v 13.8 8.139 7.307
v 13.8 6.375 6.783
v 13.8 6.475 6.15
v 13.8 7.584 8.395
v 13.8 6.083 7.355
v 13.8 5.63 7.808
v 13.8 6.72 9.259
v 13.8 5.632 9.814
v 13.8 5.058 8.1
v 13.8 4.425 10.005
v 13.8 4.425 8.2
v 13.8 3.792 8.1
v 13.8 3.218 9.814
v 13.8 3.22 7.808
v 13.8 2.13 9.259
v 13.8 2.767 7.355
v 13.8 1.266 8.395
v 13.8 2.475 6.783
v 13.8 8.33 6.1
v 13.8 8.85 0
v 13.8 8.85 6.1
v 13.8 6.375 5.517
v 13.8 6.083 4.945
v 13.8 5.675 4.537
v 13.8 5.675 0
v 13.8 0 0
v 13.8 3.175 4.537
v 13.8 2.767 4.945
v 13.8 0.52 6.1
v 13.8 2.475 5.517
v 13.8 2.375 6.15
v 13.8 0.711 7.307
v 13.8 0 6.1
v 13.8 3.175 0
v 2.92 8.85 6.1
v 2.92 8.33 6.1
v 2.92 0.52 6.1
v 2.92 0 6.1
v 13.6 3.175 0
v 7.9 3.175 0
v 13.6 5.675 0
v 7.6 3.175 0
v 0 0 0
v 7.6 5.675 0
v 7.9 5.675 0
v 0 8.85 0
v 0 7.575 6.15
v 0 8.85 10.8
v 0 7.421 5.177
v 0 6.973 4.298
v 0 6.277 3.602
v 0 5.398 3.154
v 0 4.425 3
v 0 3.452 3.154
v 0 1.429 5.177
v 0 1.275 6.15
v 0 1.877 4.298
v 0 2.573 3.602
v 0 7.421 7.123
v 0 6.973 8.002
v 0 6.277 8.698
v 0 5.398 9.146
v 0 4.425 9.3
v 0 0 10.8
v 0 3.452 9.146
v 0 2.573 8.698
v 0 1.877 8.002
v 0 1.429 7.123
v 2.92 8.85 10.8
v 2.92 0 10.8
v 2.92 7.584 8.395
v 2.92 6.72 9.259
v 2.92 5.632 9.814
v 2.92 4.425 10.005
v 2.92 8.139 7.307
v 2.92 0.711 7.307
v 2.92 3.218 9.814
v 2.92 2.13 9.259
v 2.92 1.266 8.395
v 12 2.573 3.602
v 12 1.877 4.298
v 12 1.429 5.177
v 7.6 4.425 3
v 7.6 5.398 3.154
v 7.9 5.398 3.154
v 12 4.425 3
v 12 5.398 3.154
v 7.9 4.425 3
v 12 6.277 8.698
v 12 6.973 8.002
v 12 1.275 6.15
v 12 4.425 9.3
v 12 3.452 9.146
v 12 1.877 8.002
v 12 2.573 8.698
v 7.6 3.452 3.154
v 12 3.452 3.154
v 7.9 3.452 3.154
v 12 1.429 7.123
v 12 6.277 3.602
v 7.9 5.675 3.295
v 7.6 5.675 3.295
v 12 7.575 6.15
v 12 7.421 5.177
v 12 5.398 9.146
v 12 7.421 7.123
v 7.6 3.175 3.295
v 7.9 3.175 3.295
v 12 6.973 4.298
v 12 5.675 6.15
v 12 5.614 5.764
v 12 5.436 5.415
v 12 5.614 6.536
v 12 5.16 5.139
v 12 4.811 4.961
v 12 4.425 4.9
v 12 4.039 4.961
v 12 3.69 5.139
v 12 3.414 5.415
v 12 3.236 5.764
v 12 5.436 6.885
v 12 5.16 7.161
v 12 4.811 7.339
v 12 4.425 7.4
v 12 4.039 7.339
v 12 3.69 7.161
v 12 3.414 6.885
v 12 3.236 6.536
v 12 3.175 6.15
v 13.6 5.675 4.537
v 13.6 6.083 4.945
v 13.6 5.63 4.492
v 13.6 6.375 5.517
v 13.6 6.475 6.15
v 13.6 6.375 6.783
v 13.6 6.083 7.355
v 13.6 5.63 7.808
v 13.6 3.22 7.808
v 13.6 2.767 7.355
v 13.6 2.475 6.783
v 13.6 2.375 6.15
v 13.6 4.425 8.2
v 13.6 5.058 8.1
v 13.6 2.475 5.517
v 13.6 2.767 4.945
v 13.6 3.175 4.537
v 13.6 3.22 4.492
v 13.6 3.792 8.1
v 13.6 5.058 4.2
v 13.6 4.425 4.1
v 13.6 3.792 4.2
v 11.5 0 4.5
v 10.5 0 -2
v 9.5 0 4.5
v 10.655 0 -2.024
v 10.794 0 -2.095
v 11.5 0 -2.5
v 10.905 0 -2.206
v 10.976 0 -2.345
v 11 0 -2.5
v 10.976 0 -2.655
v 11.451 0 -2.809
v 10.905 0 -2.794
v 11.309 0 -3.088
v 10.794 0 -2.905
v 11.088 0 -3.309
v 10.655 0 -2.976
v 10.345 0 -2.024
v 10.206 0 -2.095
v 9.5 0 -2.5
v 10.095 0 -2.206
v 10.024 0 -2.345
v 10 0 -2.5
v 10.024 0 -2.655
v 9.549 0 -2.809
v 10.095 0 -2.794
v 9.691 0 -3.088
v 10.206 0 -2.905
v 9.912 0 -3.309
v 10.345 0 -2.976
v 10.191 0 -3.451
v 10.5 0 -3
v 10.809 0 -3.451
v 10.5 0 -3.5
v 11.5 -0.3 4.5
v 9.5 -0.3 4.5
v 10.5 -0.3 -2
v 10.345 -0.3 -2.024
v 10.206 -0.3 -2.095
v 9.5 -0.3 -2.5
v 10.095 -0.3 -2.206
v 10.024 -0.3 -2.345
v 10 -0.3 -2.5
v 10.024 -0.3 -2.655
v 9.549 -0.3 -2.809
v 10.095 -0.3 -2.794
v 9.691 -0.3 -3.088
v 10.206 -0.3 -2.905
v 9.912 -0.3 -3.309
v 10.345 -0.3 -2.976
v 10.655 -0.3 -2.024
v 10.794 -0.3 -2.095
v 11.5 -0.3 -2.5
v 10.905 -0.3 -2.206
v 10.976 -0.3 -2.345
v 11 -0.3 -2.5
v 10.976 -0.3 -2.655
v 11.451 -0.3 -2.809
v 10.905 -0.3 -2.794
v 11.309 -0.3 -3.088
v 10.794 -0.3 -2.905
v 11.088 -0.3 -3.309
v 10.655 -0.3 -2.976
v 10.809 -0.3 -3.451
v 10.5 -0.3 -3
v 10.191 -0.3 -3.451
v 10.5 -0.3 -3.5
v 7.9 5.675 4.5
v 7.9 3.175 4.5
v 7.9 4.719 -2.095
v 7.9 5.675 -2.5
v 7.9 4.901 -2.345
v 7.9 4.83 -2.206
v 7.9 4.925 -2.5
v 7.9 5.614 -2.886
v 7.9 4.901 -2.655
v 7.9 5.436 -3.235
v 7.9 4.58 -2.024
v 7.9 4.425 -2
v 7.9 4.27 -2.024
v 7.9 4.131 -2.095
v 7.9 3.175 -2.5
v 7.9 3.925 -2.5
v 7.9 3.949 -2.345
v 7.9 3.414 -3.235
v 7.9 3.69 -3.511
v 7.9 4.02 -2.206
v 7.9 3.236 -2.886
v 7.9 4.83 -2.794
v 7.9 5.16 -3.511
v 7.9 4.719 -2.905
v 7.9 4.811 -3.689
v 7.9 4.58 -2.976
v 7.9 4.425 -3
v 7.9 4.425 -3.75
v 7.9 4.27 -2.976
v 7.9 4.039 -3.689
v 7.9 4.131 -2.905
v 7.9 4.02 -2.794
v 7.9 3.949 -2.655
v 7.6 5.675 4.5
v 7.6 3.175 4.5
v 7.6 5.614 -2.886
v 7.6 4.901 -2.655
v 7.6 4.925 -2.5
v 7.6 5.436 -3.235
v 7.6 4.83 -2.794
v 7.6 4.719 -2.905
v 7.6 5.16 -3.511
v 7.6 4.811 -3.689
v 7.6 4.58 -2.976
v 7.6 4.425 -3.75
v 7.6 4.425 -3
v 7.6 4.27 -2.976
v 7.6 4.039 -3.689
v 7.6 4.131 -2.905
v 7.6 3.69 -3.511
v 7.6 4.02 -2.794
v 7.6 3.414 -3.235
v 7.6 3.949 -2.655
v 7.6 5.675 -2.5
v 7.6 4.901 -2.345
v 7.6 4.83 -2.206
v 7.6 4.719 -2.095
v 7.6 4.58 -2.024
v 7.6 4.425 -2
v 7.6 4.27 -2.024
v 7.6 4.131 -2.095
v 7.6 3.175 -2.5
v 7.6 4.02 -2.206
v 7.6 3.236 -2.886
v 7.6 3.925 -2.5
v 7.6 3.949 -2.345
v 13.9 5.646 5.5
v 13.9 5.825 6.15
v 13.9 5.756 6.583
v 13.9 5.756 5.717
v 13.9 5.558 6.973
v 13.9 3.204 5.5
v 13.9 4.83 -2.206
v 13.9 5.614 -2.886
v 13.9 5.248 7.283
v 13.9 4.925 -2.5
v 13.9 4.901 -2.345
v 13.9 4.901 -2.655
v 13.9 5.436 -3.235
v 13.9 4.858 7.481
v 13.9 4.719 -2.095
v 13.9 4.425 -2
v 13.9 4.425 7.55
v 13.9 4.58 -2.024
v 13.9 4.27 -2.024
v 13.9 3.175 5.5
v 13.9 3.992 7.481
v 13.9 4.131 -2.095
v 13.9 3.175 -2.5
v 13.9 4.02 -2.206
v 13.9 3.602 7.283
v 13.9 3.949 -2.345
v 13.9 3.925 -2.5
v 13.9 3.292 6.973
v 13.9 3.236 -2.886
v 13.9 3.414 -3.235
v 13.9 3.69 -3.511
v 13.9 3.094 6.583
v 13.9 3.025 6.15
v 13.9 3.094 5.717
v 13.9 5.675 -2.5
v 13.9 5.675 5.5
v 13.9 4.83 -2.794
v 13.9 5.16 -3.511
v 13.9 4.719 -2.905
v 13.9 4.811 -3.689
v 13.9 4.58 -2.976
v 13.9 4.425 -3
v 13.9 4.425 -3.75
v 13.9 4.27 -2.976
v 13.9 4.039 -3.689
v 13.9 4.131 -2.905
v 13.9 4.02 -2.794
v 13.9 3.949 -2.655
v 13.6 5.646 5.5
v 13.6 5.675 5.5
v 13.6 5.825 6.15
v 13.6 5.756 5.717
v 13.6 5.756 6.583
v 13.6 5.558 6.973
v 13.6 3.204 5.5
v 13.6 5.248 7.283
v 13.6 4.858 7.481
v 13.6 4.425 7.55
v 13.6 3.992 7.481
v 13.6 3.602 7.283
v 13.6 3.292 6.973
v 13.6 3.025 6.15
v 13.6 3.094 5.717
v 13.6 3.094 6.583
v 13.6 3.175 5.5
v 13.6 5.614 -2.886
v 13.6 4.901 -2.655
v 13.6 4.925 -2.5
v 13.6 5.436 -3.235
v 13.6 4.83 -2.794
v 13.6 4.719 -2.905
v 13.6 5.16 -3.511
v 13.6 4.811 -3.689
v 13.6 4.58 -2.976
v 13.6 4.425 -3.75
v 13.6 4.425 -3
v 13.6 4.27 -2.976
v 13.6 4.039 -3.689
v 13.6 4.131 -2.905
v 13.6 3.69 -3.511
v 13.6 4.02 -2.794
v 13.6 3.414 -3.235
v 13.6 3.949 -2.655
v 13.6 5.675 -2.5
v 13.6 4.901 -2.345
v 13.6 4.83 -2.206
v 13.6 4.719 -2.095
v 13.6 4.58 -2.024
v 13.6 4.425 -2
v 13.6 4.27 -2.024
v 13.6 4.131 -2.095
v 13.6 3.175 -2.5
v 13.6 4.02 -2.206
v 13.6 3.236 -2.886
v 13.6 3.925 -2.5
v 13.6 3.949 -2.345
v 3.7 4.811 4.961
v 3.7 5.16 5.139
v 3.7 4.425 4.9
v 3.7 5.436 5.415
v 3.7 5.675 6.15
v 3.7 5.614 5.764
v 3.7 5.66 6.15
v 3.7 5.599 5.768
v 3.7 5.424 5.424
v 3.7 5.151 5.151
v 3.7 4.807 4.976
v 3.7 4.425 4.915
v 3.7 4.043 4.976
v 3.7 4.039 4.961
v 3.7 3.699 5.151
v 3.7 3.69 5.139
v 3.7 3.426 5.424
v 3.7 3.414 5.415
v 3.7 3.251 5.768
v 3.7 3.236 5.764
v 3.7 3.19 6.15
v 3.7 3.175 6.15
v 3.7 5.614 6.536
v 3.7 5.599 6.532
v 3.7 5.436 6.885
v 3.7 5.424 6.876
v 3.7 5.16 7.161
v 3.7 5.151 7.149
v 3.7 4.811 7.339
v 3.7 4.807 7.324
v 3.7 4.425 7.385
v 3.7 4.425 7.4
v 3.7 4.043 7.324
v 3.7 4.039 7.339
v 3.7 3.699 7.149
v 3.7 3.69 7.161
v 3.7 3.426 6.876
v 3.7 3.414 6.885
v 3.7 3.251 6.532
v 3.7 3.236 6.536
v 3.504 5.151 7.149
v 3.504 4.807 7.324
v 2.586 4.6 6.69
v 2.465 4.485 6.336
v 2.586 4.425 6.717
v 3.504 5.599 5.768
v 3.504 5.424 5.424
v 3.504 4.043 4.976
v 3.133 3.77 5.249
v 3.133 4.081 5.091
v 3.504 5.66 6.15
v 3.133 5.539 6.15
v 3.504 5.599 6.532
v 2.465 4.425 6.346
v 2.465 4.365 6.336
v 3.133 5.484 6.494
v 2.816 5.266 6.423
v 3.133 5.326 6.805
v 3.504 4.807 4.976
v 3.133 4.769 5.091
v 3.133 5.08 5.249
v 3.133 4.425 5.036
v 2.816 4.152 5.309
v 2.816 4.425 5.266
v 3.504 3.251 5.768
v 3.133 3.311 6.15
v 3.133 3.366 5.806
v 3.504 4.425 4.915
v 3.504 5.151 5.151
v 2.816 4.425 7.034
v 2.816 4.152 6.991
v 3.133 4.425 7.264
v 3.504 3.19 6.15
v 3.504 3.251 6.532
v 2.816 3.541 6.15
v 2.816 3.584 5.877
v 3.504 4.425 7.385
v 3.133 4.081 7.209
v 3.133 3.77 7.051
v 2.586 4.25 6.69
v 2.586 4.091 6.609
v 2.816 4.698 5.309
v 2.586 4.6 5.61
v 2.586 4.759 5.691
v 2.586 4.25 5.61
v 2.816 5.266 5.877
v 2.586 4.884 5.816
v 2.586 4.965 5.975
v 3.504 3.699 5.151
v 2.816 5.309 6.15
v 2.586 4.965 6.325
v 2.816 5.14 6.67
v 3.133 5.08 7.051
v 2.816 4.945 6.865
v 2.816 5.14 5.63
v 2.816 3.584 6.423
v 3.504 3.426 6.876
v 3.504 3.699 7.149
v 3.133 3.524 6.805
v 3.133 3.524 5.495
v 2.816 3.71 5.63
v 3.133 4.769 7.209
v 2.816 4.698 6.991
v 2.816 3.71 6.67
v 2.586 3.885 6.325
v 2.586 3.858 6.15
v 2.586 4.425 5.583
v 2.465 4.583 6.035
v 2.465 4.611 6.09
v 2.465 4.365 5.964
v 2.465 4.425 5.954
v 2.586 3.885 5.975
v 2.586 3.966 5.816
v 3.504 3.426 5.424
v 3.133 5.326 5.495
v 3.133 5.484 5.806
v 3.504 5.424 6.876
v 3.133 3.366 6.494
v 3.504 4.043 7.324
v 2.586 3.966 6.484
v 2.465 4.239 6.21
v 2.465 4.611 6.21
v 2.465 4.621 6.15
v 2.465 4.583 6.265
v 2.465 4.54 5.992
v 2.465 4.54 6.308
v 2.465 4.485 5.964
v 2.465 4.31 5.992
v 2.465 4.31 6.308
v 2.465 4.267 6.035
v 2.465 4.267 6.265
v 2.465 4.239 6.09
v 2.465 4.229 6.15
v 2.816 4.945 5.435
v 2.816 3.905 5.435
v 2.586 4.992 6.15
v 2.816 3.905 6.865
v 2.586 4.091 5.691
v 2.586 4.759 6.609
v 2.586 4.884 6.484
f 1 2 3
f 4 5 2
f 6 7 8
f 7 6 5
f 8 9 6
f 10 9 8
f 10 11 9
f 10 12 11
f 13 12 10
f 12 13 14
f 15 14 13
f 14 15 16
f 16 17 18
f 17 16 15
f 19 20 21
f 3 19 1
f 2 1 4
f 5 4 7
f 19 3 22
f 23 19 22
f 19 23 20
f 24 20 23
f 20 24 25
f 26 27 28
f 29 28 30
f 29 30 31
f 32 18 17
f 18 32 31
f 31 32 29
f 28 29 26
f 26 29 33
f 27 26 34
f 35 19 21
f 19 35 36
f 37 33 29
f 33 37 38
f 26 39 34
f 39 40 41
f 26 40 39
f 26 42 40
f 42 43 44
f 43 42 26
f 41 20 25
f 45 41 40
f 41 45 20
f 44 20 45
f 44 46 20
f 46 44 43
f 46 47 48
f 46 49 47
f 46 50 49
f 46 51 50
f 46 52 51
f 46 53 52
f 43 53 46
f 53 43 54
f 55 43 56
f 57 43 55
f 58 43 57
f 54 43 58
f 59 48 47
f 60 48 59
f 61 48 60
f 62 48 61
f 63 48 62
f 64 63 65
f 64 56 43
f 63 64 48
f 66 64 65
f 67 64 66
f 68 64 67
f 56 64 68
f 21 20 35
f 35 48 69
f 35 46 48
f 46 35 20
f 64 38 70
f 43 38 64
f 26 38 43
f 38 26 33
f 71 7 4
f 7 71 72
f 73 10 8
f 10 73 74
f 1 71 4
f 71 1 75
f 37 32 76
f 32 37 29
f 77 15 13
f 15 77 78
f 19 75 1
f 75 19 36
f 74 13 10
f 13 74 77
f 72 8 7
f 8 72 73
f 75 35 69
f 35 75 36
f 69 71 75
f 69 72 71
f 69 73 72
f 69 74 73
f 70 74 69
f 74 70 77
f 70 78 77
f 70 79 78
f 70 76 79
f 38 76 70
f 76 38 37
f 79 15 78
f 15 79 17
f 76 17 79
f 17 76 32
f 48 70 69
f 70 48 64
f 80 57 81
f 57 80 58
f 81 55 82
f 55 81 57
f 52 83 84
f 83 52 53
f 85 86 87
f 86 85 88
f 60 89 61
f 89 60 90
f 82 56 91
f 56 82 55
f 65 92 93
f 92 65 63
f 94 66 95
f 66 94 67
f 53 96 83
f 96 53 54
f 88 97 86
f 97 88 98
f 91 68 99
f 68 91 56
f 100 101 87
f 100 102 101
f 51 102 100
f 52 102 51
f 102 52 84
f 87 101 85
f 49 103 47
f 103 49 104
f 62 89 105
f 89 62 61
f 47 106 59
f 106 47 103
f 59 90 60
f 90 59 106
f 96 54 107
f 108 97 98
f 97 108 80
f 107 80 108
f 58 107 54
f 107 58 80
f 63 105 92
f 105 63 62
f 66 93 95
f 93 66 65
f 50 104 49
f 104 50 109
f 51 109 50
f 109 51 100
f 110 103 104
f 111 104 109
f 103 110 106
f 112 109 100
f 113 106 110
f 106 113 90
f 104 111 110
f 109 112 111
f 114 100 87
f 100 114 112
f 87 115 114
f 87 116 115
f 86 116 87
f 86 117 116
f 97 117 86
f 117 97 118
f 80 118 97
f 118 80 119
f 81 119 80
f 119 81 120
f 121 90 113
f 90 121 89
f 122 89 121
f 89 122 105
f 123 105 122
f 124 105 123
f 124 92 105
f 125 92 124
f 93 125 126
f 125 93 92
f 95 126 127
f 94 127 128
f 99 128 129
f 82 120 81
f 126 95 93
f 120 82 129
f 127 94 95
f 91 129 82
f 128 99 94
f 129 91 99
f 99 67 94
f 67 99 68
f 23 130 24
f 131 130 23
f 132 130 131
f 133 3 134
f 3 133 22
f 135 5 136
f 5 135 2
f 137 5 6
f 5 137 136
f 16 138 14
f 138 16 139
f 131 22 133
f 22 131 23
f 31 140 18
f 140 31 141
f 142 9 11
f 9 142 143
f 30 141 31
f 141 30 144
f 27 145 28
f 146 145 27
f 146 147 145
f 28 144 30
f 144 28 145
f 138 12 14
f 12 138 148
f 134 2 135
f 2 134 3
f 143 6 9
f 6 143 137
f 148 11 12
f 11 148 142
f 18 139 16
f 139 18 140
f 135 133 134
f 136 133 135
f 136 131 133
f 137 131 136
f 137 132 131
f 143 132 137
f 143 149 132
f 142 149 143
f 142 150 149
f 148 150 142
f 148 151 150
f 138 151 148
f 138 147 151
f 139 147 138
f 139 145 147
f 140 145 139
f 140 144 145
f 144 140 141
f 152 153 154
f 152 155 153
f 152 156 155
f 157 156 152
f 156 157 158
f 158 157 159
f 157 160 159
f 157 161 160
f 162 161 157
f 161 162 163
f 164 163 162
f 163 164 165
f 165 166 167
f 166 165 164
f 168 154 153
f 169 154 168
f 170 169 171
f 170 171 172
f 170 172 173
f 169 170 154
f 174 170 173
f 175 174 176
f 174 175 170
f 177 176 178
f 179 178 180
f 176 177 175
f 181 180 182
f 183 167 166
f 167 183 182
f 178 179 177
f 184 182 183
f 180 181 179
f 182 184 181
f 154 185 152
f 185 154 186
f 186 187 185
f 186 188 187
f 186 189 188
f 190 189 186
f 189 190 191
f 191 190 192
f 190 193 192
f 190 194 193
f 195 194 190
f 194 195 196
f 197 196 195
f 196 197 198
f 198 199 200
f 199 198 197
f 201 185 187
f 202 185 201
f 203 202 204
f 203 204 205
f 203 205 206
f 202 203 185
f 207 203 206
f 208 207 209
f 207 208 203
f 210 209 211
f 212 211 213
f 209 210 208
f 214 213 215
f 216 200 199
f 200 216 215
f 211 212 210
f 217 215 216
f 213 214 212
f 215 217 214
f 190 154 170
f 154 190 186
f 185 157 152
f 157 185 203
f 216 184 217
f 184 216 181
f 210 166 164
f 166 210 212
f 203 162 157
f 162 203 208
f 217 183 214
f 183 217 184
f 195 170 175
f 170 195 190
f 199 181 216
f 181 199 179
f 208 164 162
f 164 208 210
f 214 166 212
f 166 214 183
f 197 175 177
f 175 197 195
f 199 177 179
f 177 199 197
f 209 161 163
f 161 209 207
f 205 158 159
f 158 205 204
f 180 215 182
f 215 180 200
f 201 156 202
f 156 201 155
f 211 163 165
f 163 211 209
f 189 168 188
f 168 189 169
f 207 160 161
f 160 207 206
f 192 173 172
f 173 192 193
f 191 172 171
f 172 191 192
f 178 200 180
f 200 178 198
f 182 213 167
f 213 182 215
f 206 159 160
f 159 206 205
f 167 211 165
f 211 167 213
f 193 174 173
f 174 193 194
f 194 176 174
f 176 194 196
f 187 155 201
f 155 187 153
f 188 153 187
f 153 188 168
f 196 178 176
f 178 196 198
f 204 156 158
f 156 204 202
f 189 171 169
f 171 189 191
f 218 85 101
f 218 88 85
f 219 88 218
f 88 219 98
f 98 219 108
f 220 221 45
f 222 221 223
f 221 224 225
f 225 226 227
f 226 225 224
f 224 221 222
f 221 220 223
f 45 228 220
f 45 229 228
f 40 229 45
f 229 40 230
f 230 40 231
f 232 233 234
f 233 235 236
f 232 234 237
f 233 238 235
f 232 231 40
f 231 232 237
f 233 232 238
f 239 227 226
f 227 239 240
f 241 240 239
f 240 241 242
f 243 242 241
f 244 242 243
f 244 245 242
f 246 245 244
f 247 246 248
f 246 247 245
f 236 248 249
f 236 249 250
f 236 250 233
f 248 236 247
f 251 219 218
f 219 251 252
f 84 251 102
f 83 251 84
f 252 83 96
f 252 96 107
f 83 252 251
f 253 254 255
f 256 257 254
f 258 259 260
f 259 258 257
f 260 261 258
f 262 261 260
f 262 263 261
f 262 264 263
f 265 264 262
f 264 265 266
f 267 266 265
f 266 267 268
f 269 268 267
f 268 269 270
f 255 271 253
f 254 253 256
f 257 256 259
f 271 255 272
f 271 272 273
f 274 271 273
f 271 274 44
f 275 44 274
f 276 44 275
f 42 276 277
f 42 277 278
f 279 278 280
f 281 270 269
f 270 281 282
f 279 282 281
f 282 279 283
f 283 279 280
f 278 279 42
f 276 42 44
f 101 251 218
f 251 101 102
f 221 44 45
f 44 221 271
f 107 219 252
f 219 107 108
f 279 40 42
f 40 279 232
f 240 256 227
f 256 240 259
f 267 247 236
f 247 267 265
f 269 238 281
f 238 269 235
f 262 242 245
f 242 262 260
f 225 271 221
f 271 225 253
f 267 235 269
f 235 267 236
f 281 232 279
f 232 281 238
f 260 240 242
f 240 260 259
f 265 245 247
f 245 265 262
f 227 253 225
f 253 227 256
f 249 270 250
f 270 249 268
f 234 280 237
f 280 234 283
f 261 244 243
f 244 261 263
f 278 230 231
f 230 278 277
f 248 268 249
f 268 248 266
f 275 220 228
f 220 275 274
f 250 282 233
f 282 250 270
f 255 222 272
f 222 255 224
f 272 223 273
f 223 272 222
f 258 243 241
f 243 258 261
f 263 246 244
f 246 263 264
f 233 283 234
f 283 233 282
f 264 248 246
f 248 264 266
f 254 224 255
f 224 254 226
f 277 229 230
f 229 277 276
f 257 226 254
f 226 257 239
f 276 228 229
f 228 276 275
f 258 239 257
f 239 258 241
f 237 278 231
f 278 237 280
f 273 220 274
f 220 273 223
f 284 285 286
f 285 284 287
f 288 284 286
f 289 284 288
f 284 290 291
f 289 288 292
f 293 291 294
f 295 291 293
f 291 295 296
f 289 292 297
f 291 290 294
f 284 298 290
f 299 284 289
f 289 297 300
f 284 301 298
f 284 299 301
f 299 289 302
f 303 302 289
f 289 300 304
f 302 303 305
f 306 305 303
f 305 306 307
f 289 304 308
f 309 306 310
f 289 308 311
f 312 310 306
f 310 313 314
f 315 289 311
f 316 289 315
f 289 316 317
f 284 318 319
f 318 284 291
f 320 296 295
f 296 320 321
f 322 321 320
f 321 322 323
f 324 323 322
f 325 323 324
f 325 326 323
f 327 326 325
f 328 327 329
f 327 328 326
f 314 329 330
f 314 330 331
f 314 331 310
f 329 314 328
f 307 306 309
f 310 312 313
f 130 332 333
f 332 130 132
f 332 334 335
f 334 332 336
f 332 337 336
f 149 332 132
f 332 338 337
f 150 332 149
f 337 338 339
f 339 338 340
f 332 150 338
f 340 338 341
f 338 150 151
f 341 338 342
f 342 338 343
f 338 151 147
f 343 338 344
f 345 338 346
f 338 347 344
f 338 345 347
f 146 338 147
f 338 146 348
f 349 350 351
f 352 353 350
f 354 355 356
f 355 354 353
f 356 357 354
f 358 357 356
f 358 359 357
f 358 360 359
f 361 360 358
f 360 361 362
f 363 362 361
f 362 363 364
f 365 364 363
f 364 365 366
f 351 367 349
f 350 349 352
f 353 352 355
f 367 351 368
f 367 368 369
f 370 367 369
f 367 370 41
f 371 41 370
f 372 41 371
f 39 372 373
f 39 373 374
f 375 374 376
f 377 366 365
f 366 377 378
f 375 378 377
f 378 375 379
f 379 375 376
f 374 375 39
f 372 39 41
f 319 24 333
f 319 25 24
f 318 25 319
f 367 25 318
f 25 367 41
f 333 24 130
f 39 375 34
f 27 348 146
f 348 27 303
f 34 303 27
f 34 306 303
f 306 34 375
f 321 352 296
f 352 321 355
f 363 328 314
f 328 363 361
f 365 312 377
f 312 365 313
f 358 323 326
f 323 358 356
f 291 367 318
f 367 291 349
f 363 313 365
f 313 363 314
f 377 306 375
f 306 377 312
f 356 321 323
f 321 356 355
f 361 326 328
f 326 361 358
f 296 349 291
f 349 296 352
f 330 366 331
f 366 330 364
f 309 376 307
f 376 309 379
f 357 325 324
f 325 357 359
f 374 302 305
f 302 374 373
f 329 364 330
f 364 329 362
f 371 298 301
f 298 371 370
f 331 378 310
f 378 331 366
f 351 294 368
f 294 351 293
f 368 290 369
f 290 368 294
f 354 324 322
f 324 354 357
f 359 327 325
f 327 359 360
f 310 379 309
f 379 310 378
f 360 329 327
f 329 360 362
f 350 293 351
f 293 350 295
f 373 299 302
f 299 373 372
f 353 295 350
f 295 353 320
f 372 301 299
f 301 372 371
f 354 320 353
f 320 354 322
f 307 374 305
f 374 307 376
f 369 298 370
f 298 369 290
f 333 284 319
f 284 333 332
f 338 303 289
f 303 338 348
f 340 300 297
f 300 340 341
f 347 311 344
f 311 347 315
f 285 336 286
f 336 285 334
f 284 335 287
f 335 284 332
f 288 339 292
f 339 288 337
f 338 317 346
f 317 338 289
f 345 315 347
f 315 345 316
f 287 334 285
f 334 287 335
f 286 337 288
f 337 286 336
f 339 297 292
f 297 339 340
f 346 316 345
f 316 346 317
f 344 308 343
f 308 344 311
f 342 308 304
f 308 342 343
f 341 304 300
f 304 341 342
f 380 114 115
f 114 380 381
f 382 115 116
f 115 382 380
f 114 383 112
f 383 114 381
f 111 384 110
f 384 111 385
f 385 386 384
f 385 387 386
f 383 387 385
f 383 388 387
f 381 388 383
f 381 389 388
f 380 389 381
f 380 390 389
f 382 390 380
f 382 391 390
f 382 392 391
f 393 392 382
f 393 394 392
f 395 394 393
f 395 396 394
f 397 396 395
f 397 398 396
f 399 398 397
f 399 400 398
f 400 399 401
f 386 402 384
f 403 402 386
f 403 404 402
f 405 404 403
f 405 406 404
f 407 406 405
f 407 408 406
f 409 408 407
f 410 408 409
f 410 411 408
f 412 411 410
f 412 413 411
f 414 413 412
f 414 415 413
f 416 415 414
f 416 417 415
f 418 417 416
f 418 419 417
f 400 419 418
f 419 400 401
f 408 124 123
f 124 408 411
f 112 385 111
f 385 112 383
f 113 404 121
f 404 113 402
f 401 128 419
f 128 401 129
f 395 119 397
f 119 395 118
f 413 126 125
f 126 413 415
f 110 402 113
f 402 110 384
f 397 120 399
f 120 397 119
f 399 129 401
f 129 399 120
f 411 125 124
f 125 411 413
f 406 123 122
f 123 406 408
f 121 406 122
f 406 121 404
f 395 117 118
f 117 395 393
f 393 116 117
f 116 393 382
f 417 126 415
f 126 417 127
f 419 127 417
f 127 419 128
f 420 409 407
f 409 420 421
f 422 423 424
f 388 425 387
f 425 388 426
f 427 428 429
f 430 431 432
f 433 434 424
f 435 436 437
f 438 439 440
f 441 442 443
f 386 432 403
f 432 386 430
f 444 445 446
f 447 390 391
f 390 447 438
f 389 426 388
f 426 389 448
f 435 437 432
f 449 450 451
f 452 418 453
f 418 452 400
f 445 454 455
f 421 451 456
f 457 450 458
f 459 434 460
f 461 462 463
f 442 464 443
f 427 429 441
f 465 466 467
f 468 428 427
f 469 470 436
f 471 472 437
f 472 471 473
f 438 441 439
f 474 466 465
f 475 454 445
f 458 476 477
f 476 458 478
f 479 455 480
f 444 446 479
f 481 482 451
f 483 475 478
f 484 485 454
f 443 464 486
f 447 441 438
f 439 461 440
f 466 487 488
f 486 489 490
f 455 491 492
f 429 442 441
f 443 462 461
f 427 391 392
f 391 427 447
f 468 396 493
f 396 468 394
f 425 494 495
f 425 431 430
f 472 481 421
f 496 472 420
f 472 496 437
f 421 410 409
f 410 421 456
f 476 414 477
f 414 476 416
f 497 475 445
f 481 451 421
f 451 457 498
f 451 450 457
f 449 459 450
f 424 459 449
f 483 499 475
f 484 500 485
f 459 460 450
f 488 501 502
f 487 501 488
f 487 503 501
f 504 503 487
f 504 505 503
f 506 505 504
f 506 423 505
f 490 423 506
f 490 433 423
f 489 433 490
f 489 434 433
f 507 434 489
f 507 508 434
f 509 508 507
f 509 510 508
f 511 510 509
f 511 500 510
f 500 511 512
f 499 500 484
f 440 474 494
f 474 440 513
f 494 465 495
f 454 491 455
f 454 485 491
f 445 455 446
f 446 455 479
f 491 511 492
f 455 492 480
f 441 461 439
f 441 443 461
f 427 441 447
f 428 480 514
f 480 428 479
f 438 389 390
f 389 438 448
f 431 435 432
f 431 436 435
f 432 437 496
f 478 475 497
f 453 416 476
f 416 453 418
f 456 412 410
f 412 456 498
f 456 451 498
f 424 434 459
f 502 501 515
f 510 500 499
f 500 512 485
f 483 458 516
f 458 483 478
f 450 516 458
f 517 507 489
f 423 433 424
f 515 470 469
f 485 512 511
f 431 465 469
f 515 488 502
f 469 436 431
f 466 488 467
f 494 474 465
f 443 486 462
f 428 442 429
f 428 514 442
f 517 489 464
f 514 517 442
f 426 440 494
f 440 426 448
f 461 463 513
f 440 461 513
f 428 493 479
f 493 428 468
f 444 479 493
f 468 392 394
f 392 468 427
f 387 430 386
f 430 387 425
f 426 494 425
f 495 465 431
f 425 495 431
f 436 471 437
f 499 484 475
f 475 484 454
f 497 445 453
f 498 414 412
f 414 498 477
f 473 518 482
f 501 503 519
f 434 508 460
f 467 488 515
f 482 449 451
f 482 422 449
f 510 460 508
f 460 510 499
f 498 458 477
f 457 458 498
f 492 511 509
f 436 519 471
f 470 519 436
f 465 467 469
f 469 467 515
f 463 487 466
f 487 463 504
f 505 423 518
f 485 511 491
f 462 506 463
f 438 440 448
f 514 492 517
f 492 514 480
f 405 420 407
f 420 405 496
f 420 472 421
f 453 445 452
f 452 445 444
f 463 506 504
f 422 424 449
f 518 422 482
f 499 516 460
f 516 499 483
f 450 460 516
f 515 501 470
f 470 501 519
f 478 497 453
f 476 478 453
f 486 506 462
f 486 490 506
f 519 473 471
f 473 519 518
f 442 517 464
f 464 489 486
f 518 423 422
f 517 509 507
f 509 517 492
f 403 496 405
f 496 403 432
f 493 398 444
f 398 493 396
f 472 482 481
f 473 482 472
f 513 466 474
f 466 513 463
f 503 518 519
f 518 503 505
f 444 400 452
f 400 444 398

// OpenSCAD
$fn=20;


difference(){

    union(){
        cube([13.8,8.85,6.1]);

        translate([13.8-10.88,8.85/2,6.1])
        rotate([0,90,0])
        cylinder(r=7.81/2,h=10.88);


        translate([0,8.85,0])
        rotate([0,0,-90])
        cube([8.85,13.8-10.88,10.8]);
    }
    
    translate([0,8.85/2,6.3/2+3])
    rotate([0,90,0])
    cylinder(r=6.3/2, h=12);
    
    translate([13.6,8.85/2,6.3/2+3])
    rotate([0,90,0])
    cylinder(r=4.1/2, h=1);
}


module pin(w){
    
    difference(){
        union(){
            cube([0.3,w,7]);
            
            translate([0,w/2,0])
            rotate([0,90,0])
            cylinder(h=0.3,r=w/2);
        }
        
        translate([0,w/2,0])
        rotate([0,90,0])
        cylinder(h=0.3,r=1/2);
    }
}

translate([11.5,-0.3,-2.5])
rotate([0,0,90])
pin(2);

translate([13.8-0.2 -6,8.85/2 -2.5/2,-2.5])
pin(2.5);

translate([13.8-0.2,8.85/2 -2.5/2,-2.5]){
    pin(2.5);
    translate([0,0,1]) cube([0.3,2.5,7]);
    
    translate([0,2.5/2,6.3/2+3+2.5])
    rotate([0,90,0])
    cylinder(h=0.3,r=1.4);
}

    translate([1.2+2.5,8.85/2,6.3/2+3])
    rotate([0,90,0]){
        cylinder(r=2.5/2, h=11-2.5);
        sphere(2.5/2);
    }
